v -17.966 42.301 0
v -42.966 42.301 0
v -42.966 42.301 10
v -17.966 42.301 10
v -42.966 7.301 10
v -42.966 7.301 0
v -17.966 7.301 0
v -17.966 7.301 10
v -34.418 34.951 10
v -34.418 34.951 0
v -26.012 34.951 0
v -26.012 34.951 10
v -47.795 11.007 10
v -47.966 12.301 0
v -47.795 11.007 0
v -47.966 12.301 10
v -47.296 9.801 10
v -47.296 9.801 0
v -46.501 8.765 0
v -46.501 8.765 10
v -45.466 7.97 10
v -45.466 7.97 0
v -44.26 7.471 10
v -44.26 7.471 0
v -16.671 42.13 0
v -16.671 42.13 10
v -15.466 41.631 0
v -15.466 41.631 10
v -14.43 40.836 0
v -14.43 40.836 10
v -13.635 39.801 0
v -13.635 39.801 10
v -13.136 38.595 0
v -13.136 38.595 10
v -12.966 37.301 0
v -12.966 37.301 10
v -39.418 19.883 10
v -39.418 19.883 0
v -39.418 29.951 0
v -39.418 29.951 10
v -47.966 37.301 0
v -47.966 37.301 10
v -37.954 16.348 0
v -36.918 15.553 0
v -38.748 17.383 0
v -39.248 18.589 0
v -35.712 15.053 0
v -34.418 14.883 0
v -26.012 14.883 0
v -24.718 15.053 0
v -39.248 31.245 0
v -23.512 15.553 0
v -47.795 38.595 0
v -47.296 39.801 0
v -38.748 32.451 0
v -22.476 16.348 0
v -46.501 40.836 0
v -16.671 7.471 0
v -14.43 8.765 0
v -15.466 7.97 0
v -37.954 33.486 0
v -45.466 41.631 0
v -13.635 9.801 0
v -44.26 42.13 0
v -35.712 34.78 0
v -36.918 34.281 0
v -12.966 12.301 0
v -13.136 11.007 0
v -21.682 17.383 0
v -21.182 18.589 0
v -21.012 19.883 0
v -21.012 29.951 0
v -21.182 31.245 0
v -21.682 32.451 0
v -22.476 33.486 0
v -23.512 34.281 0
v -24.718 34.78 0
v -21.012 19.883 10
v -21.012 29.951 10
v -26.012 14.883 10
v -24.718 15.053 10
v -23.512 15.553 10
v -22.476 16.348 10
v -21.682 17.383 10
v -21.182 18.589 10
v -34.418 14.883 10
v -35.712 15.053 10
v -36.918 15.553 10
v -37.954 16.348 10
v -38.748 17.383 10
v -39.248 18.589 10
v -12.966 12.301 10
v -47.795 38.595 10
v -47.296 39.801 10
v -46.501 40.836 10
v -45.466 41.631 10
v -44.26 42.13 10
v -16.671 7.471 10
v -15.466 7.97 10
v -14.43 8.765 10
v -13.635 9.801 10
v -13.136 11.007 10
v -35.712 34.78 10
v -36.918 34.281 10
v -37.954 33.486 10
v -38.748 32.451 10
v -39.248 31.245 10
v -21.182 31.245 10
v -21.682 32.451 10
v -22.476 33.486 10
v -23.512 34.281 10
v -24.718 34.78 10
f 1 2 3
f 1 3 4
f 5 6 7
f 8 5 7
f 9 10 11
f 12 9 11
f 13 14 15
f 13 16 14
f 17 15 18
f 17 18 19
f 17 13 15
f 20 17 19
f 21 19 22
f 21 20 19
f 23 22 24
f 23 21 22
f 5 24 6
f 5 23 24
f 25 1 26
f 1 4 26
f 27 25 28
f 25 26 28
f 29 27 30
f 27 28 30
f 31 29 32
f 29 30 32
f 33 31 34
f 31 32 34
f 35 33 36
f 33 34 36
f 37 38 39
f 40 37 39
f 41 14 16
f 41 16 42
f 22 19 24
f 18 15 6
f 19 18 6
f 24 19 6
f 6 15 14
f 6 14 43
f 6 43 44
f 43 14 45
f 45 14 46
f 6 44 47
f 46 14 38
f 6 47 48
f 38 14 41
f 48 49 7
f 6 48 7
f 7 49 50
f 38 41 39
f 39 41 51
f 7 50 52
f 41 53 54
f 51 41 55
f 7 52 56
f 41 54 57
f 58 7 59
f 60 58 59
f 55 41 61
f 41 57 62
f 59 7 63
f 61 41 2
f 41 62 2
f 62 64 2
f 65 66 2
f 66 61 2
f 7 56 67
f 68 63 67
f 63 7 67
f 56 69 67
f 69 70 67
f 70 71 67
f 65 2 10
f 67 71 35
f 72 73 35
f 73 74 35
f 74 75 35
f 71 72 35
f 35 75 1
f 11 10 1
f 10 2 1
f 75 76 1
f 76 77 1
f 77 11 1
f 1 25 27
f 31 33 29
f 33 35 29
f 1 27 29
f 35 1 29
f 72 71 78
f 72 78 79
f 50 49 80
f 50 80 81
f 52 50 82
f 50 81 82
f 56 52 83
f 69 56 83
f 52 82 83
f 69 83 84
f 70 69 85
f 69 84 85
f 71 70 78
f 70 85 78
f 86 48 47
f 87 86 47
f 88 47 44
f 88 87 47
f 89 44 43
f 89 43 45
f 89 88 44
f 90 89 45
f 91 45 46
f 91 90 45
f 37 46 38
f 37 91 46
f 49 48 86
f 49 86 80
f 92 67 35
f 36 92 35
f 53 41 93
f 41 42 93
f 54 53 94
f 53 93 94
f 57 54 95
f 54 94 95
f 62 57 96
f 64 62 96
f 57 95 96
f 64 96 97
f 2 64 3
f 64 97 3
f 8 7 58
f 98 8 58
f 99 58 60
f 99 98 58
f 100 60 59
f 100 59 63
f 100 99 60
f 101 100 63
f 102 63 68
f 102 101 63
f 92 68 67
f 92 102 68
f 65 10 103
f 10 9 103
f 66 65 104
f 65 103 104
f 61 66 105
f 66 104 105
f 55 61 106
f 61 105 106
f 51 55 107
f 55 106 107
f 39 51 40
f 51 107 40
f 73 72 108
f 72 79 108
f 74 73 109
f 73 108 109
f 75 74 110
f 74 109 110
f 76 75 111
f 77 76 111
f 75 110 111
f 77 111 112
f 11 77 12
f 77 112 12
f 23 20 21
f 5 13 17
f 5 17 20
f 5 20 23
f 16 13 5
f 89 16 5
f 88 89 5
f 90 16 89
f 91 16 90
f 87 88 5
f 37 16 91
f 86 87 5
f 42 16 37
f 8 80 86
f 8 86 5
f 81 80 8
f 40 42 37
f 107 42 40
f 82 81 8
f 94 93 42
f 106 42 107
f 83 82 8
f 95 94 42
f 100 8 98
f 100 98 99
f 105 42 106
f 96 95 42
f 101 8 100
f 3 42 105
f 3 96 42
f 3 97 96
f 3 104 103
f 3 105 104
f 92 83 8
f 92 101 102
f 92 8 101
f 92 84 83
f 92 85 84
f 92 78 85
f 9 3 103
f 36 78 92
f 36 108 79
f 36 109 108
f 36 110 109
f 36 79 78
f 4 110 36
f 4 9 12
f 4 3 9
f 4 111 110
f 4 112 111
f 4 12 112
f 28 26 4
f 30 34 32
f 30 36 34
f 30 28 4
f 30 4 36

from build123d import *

# Parameters (mm, degrees)
F0_W     = 35
F0_H     = 35
F1_DEPTH = 10
F2_W     = 18.406059
F2_H     = 20.067719
F3_DEPTH = 25
F4_R     = 5


with BuildPart() as f1:
    # F0 (on Top) → F1 (new body)
    with BuildSketch(Plane.XY):
        with Locations((-30.465538, 24.800614)):
            Rectangle(F0_W, F0_H)
    extrude(amount=F1_DEPTH)

    # F2 (on Top) → F3 (cut)
    with BuildSketch(Plane.XY):
        with Locations((-30.214937, 24.916981)):
            Rectangle(F2_W, F2_H)
    extrude(amount=F3_DEPTH, mode=Mode.SUBTRACT)

    # F4
    f4_edges = [f1.edges().sort_by_distance(p)[0] for p in [
        (-12.965538, 42.300614, 5),
        (-47.965538, 42.300614, 5),
        (-47.965538, 7.300614, 5),
        (-12.965538, 7.300614, 5),
        (-21.011908, 14.883122, 5),
        (-39.417967, 14.883122, 5),
        (-39.417967, 34.950841, 5),
        (-21.011908, 34.950841, 5),
    ]]
    fillet(f4_edges, radius=F4_R)


solid = f1.part
